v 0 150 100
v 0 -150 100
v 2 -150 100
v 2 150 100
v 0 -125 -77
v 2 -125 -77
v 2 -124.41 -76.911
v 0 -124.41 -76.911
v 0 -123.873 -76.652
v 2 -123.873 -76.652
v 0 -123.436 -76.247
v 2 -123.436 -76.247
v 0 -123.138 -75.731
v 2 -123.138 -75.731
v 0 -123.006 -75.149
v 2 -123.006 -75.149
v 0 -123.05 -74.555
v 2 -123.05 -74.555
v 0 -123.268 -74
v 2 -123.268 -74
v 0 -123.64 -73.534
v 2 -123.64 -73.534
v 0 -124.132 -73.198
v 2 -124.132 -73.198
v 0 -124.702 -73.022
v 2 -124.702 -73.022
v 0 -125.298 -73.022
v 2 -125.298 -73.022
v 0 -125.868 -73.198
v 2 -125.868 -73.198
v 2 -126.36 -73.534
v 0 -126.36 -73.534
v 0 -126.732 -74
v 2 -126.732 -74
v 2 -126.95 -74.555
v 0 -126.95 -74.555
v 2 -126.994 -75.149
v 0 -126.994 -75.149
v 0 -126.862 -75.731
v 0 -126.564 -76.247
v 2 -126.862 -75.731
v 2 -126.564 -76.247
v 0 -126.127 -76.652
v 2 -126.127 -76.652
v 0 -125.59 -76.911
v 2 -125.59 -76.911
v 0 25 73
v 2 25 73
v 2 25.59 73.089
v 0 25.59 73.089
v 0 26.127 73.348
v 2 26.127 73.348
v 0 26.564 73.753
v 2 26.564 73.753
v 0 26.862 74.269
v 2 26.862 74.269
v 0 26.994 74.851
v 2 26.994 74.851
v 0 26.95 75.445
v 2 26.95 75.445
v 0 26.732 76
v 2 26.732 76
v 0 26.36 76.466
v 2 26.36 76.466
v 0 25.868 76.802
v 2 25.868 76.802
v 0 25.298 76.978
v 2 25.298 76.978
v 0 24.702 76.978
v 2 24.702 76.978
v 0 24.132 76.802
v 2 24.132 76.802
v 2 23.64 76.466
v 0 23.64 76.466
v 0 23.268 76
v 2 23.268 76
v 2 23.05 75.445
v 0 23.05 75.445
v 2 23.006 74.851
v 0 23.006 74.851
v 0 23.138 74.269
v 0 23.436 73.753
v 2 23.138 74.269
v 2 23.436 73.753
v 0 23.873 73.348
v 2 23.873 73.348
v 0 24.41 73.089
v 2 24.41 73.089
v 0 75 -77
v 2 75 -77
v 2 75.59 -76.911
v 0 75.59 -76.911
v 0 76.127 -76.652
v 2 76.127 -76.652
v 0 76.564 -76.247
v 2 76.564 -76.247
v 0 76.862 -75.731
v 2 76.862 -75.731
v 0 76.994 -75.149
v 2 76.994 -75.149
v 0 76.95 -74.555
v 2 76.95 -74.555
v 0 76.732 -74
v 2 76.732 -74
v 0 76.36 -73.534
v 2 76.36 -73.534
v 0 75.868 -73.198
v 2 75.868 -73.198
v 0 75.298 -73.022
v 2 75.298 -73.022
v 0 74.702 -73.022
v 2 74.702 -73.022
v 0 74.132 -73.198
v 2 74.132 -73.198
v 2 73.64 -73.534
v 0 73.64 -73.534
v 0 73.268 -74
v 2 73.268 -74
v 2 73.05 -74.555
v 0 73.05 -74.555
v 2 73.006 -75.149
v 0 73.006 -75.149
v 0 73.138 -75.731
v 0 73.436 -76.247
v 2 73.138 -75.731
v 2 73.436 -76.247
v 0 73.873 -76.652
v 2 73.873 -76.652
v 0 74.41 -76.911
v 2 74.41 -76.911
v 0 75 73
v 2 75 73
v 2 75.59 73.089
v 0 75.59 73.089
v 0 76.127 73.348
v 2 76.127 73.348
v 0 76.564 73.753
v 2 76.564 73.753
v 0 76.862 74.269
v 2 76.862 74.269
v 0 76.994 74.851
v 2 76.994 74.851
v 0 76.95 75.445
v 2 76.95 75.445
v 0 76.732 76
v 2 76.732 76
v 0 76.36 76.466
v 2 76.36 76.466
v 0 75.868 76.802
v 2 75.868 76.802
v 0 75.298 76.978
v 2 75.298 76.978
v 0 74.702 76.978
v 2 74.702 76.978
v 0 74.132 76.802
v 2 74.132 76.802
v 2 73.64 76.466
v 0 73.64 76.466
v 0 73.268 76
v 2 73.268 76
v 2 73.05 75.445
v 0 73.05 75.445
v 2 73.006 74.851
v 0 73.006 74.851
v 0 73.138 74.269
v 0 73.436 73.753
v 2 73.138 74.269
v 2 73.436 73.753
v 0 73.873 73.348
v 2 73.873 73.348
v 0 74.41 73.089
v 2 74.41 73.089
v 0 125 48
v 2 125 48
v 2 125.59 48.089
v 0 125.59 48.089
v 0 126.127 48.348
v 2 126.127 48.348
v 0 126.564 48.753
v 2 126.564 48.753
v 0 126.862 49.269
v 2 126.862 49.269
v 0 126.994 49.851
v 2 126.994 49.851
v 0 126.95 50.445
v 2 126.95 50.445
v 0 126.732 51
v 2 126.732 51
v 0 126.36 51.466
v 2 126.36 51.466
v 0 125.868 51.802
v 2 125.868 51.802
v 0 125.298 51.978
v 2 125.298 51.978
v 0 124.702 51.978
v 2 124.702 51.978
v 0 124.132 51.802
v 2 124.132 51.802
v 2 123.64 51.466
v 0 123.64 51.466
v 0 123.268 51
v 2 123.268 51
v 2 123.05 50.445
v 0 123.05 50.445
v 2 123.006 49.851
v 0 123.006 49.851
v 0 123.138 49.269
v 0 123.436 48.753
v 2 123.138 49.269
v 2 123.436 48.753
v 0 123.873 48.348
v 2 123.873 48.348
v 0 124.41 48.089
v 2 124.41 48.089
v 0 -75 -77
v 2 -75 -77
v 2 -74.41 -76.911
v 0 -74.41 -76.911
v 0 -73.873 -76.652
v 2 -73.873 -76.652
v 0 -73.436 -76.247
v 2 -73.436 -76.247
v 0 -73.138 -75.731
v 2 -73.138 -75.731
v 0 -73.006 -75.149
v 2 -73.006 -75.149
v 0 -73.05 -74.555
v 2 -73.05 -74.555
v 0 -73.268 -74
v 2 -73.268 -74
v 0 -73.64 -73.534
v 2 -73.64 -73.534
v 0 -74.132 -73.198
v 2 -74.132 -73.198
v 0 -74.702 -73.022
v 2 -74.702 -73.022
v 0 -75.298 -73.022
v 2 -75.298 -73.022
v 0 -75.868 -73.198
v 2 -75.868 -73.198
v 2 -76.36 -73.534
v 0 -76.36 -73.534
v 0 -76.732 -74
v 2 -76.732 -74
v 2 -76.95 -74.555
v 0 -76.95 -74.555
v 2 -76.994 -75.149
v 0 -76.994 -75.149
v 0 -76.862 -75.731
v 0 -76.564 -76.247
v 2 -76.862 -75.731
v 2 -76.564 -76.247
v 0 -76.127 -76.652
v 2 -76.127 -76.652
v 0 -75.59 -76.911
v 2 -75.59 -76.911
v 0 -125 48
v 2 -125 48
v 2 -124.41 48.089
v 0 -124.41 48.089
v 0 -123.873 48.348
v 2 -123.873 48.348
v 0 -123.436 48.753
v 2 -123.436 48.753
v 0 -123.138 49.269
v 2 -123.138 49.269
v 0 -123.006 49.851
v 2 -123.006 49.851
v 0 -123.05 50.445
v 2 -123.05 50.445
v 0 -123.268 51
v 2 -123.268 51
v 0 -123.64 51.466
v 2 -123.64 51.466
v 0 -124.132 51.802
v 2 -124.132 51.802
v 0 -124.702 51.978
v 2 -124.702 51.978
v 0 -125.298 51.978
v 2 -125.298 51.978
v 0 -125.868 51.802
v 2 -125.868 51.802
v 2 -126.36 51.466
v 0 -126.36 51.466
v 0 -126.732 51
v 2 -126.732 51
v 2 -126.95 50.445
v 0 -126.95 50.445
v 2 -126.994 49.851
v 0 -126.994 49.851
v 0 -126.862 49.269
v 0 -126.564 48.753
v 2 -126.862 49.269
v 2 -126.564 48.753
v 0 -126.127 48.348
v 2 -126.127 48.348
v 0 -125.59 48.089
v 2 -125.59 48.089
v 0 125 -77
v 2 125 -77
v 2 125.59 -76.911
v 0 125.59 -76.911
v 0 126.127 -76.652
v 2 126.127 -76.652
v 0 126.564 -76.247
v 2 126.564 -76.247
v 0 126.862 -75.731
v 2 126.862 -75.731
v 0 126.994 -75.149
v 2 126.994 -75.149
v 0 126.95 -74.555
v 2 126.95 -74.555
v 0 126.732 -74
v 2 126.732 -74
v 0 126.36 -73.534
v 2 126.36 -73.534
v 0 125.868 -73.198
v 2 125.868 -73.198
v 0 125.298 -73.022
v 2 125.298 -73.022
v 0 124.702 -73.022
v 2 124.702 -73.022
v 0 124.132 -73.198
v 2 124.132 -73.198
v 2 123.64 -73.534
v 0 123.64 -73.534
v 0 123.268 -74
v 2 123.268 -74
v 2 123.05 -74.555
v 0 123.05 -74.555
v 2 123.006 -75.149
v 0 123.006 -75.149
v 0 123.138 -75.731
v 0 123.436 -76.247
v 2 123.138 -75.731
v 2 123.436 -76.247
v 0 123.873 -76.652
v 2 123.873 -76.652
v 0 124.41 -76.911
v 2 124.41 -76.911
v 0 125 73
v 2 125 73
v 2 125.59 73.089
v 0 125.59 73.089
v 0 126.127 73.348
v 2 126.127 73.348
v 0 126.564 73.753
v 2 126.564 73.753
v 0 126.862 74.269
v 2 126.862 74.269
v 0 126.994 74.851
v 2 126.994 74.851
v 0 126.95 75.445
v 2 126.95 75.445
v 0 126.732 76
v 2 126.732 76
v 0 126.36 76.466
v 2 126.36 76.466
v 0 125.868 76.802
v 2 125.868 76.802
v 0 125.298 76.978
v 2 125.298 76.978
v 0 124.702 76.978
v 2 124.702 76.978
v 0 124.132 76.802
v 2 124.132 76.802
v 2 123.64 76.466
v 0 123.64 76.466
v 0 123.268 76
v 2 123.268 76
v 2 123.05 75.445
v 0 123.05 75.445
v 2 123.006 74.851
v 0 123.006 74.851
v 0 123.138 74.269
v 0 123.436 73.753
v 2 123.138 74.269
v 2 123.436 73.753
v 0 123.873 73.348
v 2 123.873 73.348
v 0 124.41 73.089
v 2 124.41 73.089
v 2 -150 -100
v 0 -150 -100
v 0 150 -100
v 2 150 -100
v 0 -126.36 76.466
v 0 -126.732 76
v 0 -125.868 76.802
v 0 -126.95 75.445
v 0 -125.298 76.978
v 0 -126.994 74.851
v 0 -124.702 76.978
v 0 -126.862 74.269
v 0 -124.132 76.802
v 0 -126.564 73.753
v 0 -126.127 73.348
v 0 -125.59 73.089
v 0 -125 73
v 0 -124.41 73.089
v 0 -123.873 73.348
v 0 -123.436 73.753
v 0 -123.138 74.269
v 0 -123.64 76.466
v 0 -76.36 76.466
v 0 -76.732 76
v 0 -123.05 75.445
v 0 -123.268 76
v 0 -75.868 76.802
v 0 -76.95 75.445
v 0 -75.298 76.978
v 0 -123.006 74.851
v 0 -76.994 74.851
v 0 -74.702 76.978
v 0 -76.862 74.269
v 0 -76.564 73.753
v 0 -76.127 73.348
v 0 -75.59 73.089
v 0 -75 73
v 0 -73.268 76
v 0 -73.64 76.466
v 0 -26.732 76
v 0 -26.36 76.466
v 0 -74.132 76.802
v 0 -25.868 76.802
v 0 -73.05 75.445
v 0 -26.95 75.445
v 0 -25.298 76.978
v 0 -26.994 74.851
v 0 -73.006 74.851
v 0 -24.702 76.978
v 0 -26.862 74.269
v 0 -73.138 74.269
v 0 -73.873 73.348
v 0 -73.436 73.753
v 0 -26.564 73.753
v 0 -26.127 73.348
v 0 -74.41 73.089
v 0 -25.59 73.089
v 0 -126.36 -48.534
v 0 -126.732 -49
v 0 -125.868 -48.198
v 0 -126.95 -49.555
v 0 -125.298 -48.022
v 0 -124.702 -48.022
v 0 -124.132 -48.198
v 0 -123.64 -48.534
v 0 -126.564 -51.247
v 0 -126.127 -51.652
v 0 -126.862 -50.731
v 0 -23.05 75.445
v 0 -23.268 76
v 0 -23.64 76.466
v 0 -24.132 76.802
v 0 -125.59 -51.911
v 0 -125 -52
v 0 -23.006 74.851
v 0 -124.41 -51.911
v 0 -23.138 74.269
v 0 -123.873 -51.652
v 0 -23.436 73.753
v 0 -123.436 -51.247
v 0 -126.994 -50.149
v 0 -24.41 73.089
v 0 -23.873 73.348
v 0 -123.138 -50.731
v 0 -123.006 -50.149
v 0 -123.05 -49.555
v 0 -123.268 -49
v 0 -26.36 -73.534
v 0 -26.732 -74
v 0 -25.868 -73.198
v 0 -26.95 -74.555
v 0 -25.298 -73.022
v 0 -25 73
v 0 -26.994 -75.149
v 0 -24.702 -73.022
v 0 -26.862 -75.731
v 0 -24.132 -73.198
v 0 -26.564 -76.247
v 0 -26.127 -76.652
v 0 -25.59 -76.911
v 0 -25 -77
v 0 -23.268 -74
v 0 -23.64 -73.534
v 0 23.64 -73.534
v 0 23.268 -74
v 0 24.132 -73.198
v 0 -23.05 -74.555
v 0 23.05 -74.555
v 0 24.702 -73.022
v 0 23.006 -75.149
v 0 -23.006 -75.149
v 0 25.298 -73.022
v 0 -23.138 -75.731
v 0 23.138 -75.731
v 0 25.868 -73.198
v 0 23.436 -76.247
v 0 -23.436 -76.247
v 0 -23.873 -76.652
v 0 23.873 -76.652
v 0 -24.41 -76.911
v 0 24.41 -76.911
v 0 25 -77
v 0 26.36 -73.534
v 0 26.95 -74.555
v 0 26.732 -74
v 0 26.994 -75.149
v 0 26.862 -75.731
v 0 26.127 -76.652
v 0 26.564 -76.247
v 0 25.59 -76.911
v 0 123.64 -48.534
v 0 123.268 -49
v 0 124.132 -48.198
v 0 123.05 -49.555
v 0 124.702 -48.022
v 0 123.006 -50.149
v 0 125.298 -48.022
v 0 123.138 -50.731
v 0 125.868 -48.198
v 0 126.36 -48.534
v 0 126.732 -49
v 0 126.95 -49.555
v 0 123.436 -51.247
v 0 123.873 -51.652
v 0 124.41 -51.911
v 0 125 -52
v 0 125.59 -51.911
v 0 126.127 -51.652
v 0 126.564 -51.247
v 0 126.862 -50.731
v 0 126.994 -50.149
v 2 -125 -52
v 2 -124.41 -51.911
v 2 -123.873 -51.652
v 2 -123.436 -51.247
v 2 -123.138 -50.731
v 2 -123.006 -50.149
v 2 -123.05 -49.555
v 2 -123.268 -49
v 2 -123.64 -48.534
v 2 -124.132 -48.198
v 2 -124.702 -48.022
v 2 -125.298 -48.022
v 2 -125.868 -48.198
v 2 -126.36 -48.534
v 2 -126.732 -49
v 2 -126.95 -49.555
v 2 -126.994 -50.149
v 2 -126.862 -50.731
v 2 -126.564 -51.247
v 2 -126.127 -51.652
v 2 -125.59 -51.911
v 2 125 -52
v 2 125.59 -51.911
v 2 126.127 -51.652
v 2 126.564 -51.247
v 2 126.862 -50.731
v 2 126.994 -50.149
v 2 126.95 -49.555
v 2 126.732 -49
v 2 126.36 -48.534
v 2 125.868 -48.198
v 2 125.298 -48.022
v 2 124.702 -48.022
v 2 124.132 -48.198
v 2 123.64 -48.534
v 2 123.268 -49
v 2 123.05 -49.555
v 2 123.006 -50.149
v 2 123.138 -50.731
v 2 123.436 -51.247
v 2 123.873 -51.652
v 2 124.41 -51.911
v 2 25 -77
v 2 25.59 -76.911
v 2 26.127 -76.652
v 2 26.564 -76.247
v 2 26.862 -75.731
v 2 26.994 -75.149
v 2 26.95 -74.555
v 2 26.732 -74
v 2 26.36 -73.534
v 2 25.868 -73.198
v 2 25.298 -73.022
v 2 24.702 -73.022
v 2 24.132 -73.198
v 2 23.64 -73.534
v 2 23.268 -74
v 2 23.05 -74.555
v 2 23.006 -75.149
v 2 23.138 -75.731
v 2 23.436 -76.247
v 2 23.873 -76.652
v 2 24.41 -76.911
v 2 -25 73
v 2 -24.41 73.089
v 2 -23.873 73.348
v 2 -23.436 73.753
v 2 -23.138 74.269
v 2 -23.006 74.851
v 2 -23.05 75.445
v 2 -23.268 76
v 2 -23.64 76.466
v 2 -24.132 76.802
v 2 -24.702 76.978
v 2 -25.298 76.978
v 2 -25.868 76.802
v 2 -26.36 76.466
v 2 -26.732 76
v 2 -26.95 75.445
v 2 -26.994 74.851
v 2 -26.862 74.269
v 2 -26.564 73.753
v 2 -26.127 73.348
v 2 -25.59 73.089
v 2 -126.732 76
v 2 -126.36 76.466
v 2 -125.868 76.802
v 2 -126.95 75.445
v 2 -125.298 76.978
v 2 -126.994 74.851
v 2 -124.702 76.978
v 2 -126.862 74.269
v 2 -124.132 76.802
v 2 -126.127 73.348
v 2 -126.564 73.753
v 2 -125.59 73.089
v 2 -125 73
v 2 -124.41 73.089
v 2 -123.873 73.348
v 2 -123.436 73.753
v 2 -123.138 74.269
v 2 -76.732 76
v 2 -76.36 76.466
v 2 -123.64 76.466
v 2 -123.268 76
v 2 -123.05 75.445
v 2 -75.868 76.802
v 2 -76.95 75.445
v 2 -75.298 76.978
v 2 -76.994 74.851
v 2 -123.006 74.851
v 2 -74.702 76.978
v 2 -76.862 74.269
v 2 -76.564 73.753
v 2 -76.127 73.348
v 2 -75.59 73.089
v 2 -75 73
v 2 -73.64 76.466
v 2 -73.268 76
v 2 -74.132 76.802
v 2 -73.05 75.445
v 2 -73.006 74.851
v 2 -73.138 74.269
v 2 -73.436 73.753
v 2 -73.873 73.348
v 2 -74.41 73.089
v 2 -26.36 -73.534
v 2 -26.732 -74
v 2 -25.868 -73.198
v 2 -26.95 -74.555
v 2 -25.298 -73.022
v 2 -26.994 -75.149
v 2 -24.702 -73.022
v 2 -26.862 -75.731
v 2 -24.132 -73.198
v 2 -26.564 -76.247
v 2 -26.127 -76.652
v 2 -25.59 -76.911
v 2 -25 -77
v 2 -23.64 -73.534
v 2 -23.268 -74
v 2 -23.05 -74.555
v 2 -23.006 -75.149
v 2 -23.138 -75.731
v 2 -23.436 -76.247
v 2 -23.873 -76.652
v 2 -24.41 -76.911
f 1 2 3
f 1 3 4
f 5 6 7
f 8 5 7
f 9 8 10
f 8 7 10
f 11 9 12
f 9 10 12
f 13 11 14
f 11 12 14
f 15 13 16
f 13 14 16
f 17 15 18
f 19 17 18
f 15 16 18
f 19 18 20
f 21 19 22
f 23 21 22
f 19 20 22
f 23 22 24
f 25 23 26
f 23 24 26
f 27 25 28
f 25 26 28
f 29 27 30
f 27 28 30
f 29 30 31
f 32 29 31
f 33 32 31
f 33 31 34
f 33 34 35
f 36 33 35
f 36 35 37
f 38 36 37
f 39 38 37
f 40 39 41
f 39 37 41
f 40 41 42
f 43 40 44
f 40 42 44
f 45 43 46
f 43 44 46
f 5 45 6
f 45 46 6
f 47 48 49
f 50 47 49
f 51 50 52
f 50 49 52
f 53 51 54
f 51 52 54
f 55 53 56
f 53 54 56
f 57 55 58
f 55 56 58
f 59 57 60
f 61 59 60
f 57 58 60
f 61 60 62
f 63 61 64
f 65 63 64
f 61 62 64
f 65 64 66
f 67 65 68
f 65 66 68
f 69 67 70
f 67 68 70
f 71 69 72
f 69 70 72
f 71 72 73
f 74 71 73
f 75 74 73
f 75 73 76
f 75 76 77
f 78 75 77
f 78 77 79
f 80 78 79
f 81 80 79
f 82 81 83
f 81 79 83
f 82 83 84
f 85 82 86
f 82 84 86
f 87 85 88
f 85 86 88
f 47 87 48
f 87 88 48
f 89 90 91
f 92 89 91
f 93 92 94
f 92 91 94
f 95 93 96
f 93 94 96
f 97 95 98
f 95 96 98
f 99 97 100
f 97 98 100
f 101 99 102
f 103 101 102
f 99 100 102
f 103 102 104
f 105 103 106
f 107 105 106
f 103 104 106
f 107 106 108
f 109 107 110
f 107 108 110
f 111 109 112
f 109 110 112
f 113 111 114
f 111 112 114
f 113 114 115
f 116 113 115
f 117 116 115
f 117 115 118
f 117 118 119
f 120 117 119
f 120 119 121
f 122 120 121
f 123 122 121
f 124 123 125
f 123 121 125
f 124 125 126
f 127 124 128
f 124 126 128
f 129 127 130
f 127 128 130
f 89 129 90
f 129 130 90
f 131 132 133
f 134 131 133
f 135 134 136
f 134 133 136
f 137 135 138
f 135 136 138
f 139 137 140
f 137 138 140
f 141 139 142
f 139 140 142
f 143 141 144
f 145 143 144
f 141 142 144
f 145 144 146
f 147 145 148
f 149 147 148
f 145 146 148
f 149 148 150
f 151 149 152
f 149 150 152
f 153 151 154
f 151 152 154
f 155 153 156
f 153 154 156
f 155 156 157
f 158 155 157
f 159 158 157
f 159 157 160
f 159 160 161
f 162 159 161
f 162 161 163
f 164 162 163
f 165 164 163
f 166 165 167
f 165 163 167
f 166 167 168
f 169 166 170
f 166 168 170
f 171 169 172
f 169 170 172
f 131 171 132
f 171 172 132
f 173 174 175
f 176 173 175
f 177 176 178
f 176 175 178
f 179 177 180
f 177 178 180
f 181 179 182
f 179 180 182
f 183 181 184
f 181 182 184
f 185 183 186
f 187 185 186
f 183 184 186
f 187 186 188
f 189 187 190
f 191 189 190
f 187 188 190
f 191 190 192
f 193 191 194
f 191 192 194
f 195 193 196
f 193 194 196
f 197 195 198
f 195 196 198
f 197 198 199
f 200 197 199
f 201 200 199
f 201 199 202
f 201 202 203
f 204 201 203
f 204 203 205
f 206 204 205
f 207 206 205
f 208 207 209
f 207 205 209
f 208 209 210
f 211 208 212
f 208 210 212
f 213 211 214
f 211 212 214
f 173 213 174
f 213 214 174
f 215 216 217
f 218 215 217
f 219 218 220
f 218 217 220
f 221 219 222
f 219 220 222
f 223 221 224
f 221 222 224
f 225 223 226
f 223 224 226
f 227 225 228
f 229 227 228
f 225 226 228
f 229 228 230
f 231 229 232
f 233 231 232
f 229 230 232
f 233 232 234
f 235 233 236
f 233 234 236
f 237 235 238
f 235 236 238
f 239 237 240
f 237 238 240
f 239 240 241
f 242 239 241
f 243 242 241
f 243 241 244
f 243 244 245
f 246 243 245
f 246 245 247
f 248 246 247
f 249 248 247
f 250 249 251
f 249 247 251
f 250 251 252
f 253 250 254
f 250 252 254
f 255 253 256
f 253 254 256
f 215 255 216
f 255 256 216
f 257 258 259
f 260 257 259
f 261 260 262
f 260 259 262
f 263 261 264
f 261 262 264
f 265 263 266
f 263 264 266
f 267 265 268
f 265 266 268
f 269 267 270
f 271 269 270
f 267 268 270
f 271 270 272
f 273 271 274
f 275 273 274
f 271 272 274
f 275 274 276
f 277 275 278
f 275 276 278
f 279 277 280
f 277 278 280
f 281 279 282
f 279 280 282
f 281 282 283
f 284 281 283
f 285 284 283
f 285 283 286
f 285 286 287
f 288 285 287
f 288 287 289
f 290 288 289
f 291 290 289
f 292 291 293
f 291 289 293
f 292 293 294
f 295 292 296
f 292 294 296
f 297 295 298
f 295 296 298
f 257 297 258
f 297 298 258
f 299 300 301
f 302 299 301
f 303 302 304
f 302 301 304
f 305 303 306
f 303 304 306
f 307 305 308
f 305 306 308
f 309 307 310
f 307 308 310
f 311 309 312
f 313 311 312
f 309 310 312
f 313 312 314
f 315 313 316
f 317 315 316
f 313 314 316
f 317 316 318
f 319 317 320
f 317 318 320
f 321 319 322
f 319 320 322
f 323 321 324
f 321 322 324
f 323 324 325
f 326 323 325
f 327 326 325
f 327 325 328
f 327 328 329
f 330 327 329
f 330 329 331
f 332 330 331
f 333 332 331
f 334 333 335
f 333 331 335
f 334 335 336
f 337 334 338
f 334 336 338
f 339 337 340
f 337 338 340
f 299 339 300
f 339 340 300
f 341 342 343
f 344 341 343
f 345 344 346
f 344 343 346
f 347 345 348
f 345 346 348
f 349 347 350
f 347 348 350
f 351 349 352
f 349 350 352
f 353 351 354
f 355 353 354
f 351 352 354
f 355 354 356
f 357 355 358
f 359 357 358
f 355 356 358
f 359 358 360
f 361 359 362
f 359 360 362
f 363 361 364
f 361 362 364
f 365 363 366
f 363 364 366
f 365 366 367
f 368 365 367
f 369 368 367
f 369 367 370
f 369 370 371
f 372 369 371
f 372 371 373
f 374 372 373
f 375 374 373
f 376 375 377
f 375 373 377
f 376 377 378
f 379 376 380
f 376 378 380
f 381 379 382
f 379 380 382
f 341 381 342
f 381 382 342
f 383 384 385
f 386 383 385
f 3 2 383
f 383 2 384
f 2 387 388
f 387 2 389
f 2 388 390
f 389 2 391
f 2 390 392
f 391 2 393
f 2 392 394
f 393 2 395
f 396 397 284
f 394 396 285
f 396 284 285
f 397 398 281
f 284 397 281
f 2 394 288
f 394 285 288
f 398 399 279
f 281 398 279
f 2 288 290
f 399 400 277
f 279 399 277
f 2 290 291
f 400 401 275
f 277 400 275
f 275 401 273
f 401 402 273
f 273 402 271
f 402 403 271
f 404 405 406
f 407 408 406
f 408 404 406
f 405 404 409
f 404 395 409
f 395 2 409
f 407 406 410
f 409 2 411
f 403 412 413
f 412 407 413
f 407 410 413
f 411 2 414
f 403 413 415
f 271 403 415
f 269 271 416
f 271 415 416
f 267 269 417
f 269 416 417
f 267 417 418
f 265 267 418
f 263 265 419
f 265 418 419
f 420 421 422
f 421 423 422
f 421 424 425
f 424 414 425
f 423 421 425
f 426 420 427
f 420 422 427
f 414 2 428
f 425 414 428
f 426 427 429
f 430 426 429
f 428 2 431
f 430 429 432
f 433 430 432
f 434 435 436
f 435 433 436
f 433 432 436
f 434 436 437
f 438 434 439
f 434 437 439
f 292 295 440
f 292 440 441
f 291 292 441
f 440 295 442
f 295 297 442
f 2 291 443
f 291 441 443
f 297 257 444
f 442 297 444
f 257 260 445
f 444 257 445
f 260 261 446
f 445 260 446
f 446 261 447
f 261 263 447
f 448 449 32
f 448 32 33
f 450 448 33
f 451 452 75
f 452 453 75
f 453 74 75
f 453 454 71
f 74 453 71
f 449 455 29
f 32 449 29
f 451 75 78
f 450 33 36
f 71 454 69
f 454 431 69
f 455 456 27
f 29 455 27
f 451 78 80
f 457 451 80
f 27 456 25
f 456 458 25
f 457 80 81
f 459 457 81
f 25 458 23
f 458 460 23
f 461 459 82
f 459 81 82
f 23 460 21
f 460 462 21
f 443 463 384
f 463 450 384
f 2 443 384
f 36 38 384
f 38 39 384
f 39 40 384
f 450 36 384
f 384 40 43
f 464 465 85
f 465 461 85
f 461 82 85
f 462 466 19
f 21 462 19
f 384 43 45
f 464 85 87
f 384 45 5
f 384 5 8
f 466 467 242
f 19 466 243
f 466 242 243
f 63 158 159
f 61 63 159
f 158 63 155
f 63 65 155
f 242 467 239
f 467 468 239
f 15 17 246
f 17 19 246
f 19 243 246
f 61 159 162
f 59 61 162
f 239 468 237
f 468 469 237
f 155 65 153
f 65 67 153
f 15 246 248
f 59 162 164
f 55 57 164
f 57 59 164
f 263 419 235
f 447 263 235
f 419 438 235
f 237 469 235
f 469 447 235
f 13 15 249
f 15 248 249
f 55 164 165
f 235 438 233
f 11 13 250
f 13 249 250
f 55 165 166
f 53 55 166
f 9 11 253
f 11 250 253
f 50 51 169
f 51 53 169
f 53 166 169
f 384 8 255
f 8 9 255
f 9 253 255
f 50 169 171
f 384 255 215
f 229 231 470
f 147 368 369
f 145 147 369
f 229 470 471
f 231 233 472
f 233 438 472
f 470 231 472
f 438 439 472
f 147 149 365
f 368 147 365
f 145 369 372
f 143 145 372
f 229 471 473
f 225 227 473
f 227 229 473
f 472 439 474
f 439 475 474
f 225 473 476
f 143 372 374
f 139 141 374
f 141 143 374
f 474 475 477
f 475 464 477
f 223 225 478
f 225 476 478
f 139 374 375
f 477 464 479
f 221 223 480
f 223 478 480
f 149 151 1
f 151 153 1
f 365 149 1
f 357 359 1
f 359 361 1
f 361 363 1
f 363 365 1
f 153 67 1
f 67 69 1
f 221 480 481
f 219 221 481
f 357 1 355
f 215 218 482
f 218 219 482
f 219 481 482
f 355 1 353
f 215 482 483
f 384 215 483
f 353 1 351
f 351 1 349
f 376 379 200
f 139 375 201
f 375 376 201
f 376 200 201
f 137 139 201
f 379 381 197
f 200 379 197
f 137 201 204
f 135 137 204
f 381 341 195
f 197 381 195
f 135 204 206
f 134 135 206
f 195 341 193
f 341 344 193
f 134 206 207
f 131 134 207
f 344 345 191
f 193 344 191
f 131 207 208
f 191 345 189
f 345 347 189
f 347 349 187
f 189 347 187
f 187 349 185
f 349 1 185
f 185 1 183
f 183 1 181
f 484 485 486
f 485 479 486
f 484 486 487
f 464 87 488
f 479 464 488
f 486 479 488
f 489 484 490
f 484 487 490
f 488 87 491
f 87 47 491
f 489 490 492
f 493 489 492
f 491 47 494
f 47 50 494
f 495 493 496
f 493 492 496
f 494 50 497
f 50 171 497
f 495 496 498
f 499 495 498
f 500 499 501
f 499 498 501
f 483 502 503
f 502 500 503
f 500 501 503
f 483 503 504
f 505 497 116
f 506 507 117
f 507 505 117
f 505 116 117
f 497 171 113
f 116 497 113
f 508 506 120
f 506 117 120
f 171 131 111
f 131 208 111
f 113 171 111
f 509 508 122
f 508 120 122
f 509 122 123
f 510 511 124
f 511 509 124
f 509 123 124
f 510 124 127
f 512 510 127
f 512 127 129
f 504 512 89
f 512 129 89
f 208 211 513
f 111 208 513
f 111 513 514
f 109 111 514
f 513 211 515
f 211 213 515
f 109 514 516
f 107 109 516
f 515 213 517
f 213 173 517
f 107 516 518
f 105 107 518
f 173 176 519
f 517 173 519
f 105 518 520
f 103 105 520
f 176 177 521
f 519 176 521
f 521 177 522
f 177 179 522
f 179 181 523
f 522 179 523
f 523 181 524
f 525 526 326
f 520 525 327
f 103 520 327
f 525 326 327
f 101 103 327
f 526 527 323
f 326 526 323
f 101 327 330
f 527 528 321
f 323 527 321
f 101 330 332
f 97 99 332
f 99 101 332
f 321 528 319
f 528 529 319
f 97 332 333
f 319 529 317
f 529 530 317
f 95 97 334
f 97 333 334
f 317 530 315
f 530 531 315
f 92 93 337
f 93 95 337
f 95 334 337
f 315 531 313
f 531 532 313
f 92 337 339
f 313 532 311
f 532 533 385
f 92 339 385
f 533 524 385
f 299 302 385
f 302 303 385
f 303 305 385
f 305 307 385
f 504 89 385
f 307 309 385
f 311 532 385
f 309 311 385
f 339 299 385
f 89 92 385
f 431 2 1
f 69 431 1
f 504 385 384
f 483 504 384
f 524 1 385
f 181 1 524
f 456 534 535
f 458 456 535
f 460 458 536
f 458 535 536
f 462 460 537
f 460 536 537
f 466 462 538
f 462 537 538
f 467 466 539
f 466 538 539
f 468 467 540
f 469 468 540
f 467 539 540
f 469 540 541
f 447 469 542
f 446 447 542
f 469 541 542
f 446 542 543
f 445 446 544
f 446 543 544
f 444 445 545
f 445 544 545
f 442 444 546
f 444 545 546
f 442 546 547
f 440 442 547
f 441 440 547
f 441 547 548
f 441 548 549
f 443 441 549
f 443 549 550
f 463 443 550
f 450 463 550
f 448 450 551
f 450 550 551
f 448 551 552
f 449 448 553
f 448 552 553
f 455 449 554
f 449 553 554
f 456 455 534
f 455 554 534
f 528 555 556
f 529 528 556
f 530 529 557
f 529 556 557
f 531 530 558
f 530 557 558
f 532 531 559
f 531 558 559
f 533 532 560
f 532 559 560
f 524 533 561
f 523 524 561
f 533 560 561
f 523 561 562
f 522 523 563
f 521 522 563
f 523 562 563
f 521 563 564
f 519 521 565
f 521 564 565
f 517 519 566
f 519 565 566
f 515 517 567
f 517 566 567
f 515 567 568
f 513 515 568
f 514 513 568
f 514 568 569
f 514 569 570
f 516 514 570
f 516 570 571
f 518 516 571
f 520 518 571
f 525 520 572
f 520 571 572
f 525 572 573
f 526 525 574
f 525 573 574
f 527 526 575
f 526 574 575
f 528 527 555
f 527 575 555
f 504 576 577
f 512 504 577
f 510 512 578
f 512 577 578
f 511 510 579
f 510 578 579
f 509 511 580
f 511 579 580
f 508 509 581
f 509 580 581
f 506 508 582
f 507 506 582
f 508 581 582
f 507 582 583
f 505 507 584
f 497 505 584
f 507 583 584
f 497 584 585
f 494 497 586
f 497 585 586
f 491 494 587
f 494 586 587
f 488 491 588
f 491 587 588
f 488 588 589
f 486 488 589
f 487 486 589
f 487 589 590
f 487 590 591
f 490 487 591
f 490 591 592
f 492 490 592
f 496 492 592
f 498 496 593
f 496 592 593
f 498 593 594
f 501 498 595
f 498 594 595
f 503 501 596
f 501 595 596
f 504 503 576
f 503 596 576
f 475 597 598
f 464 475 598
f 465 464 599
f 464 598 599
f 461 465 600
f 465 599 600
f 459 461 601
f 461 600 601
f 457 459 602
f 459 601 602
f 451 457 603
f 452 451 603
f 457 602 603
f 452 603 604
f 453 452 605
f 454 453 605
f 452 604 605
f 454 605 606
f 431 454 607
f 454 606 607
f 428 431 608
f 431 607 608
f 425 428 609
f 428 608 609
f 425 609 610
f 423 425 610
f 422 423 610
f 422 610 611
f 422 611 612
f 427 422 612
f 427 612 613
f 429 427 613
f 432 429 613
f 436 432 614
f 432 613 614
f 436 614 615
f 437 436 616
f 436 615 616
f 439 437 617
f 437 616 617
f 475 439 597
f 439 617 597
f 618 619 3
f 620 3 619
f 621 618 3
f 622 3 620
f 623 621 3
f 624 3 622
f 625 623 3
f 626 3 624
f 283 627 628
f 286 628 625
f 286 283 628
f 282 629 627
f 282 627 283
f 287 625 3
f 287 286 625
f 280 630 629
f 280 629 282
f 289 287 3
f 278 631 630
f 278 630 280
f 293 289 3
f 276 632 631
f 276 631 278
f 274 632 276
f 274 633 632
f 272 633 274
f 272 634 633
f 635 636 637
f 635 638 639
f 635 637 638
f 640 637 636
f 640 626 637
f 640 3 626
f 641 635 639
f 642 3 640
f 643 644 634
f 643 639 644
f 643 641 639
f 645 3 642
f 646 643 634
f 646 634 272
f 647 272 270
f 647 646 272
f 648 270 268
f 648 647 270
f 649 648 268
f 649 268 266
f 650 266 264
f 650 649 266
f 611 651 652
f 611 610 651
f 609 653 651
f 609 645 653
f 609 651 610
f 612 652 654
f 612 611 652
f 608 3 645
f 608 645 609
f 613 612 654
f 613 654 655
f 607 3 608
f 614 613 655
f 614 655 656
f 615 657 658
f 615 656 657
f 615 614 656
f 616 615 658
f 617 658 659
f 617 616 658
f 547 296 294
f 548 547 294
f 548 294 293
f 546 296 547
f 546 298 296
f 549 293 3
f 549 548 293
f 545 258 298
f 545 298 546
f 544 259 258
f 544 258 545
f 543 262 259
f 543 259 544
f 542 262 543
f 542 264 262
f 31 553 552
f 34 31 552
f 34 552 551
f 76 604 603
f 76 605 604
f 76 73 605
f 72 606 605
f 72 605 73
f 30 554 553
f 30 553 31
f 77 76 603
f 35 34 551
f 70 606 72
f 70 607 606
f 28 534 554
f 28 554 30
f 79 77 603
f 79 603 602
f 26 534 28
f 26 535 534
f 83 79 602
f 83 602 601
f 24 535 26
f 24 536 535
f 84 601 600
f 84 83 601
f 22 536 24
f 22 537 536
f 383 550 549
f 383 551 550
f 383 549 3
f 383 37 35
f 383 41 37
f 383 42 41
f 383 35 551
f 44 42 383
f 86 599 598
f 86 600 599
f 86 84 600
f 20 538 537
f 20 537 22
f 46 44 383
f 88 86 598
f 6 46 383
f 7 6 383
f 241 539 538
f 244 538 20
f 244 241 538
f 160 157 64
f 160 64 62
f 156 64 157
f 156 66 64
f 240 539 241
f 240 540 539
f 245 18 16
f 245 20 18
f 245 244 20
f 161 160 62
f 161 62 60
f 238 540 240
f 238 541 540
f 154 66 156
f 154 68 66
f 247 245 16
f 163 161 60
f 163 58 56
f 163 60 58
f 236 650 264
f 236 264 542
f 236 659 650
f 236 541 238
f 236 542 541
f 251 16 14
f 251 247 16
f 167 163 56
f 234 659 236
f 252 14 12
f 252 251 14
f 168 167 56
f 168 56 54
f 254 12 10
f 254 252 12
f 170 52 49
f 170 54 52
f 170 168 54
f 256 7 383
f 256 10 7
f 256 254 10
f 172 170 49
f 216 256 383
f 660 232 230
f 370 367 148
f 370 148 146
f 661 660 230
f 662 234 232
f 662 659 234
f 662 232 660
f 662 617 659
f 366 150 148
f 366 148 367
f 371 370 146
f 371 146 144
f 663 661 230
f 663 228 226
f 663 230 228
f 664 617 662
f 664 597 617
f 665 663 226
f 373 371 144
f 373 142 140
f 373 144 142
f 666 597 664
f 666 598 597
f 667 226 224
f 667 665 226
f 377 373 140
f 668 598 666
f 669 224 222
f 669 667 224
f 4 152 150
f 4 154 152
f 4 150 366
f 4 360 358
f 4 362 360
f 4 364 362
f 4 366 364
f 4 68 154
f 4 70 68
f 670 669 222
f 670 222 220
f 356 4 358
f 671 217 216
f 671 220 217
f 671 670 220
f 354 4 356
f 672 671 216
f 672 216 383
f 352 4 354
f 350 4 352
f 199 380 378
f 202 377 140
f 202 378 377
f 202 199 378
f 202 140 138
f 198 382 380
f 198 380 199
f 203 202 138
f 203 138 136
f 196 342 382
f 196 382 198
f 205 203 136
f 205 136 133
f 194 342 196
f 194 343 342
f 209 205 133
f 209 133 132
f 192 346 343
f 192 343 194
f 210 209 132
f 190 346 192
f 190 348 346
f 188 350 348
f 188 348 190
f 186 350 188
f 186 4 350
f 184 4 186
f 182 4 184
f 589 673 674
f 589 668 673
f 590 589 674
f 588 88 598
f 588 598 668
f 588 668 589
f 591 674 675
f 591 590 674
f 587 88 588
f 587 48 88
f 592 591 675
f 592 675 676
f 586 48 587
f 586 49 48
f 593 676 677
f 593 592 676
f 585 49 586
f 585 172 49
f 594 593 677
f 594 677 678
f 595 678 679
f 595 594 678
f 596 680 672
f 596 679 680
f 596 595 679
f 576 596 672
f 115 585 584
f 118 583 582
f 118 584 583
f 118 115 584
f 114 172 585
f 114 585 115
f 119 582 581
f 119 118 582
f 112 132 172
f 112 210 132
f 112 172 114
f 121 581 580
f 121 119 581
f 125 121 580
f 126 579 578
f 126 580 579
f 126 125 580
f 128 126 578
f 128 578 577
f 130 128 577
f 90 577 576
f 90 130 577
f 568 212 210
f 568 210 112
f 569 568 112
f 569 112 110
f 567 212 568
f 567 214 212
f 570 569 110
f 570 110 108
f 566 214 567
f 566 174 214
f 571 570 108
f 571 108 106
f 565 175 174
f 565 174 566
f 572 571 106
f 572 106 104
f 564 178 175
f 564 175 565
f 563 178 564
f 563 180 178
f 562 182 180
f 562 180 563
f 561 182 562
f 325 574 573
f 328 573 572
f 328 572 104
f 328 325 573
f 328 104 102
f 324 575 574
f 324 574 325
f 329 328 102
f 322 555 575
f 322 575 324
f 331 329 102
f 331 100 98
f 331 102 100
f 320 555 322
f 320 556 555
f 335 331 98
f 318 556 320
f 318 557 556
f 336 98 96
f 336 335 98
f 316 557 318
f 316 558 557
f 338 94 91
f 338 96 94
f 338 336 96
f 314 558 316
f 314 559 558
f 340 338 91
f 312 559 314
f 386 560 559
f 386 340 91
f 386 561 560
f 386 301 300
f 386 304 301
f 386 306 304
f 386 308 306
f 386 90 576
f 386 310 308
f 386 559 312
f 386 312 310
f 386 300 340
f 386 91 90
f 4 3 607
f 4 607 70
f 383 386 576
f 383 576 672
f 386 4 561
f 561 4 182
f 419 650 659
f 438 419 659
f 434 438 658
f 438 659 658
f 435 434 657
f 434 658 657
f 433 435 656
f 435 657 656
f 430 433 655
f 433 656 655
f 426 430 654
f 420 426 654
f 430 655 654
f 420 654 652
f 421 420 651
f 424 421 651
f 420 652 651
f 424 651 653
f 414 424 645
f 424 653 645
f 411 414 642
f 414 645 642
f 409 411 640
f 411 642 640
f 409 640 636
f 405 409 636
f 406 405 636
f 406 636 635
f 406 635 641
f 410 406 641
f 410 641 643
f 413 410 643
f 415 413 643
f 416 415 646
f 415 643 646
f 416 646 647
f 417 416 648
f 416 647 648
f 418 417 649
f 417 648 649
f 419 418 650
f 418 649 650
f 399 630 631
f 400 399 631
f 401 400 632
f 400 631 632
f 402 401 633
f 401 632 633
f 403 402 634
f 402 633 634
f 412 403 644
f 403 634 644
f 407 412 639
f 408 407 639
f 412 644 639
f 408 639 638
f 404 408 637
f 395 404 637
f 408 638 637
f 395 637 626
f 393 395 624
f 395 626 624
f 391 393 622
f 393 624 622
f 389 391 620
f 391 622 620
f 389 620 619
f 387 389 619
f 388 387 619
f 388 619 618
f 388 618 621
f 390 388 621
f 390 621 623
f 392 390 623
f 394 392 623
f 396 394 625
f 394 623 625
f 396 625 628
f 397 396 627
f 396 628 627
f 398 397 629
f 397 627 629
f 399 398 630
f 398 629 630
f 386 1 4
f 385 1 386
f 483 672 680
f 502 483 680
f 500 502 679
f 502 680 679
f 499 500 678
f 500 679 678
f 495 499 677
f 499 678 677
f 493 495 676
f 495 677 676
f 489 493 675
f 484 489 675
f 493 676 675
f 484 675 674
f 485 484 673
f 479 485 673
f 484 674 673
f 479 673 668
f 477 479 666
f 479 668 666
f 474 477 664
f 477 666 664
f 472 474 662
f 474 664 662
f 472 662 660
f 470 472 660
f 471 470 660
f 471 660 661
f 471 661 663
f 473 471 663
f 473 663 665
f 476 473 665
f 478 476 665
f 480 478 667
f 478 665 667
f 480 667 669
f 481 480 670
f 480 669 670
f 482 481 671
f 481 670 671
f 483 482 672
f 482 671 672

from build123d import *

# Parameters (mm, degrees)
SKETCH_1_W          = 200
SKETCH_1_H          = 300
EXTRUDE_1_DEPTH     = 2
SKETCH_2_R          = 2
CUT_EXTRUDE_1_DEPTH = 2


with BuildPart() as part:
    # Эскиз1 → Бобышка-Вытянуть1 (new body)
    with BuildSketch(Plane(origin=(0, 0, 0), x_dir=(0, 0, -1), z_dir=(1, 0, 0))):
        Rectangle(SKETCH_1_W, SKETCH_1_H)
    extrude(amount=EXTRUDE_1_DEPTH)

    # Эскиз2 → Вырез-Вытянуть1 (cut)
    with BuildSketch(Plane(origin=(2, 0, 0), x_dir=(0, 0, -1), z_dir=(1, 0, 0))):
        with Locations((-75, 125)):
            Circle(SKETCH_2_R)
        with Locations((75, 125)):
            Circle(SKETCH_2_R)
        with Locations((75, -125)):
            Circle(SKETCH_2_R)
        with Locations((-75, -125)):
            Circle(SKETCH_2_R)
        with Locations((-75, 75)):
            Circle(SKETCH_2_R)
        with Locations((-75, 25)):
            Circle(SKETCH_2_R)
        with Locations((75, 25)):
            Circle(SKETCH_2_R)
        with Locations((75, 75)):
            Circle(SKETCH_2_R)
        with Locations((-75, -25)):
            Circle(SKETCH_2_R)
        with Locations((75, -25)):
            Circle(SKETCH_2_R)
        with Locations((75, -75)):
            Circle(SKETCH_2_R)
        with Locations((-75, -75)):
            Circle(SKETCH_2_R)
        with Locations((-50, 125)):
            Circle(SKETCH_2_R)
        with Locations((50, 125)):
            Circle(SKETCH_2_R)
        with Locations((50, -125)):
            Circle(SKETCH_2_R)
        with Locations((-50, -125)):
            Circle(SKETCH_2_R)
    extrude(amount=-CUT_EXTRUDE_1_DEPTH, mode=Mode.SUBTRACT)


solid = part.part
